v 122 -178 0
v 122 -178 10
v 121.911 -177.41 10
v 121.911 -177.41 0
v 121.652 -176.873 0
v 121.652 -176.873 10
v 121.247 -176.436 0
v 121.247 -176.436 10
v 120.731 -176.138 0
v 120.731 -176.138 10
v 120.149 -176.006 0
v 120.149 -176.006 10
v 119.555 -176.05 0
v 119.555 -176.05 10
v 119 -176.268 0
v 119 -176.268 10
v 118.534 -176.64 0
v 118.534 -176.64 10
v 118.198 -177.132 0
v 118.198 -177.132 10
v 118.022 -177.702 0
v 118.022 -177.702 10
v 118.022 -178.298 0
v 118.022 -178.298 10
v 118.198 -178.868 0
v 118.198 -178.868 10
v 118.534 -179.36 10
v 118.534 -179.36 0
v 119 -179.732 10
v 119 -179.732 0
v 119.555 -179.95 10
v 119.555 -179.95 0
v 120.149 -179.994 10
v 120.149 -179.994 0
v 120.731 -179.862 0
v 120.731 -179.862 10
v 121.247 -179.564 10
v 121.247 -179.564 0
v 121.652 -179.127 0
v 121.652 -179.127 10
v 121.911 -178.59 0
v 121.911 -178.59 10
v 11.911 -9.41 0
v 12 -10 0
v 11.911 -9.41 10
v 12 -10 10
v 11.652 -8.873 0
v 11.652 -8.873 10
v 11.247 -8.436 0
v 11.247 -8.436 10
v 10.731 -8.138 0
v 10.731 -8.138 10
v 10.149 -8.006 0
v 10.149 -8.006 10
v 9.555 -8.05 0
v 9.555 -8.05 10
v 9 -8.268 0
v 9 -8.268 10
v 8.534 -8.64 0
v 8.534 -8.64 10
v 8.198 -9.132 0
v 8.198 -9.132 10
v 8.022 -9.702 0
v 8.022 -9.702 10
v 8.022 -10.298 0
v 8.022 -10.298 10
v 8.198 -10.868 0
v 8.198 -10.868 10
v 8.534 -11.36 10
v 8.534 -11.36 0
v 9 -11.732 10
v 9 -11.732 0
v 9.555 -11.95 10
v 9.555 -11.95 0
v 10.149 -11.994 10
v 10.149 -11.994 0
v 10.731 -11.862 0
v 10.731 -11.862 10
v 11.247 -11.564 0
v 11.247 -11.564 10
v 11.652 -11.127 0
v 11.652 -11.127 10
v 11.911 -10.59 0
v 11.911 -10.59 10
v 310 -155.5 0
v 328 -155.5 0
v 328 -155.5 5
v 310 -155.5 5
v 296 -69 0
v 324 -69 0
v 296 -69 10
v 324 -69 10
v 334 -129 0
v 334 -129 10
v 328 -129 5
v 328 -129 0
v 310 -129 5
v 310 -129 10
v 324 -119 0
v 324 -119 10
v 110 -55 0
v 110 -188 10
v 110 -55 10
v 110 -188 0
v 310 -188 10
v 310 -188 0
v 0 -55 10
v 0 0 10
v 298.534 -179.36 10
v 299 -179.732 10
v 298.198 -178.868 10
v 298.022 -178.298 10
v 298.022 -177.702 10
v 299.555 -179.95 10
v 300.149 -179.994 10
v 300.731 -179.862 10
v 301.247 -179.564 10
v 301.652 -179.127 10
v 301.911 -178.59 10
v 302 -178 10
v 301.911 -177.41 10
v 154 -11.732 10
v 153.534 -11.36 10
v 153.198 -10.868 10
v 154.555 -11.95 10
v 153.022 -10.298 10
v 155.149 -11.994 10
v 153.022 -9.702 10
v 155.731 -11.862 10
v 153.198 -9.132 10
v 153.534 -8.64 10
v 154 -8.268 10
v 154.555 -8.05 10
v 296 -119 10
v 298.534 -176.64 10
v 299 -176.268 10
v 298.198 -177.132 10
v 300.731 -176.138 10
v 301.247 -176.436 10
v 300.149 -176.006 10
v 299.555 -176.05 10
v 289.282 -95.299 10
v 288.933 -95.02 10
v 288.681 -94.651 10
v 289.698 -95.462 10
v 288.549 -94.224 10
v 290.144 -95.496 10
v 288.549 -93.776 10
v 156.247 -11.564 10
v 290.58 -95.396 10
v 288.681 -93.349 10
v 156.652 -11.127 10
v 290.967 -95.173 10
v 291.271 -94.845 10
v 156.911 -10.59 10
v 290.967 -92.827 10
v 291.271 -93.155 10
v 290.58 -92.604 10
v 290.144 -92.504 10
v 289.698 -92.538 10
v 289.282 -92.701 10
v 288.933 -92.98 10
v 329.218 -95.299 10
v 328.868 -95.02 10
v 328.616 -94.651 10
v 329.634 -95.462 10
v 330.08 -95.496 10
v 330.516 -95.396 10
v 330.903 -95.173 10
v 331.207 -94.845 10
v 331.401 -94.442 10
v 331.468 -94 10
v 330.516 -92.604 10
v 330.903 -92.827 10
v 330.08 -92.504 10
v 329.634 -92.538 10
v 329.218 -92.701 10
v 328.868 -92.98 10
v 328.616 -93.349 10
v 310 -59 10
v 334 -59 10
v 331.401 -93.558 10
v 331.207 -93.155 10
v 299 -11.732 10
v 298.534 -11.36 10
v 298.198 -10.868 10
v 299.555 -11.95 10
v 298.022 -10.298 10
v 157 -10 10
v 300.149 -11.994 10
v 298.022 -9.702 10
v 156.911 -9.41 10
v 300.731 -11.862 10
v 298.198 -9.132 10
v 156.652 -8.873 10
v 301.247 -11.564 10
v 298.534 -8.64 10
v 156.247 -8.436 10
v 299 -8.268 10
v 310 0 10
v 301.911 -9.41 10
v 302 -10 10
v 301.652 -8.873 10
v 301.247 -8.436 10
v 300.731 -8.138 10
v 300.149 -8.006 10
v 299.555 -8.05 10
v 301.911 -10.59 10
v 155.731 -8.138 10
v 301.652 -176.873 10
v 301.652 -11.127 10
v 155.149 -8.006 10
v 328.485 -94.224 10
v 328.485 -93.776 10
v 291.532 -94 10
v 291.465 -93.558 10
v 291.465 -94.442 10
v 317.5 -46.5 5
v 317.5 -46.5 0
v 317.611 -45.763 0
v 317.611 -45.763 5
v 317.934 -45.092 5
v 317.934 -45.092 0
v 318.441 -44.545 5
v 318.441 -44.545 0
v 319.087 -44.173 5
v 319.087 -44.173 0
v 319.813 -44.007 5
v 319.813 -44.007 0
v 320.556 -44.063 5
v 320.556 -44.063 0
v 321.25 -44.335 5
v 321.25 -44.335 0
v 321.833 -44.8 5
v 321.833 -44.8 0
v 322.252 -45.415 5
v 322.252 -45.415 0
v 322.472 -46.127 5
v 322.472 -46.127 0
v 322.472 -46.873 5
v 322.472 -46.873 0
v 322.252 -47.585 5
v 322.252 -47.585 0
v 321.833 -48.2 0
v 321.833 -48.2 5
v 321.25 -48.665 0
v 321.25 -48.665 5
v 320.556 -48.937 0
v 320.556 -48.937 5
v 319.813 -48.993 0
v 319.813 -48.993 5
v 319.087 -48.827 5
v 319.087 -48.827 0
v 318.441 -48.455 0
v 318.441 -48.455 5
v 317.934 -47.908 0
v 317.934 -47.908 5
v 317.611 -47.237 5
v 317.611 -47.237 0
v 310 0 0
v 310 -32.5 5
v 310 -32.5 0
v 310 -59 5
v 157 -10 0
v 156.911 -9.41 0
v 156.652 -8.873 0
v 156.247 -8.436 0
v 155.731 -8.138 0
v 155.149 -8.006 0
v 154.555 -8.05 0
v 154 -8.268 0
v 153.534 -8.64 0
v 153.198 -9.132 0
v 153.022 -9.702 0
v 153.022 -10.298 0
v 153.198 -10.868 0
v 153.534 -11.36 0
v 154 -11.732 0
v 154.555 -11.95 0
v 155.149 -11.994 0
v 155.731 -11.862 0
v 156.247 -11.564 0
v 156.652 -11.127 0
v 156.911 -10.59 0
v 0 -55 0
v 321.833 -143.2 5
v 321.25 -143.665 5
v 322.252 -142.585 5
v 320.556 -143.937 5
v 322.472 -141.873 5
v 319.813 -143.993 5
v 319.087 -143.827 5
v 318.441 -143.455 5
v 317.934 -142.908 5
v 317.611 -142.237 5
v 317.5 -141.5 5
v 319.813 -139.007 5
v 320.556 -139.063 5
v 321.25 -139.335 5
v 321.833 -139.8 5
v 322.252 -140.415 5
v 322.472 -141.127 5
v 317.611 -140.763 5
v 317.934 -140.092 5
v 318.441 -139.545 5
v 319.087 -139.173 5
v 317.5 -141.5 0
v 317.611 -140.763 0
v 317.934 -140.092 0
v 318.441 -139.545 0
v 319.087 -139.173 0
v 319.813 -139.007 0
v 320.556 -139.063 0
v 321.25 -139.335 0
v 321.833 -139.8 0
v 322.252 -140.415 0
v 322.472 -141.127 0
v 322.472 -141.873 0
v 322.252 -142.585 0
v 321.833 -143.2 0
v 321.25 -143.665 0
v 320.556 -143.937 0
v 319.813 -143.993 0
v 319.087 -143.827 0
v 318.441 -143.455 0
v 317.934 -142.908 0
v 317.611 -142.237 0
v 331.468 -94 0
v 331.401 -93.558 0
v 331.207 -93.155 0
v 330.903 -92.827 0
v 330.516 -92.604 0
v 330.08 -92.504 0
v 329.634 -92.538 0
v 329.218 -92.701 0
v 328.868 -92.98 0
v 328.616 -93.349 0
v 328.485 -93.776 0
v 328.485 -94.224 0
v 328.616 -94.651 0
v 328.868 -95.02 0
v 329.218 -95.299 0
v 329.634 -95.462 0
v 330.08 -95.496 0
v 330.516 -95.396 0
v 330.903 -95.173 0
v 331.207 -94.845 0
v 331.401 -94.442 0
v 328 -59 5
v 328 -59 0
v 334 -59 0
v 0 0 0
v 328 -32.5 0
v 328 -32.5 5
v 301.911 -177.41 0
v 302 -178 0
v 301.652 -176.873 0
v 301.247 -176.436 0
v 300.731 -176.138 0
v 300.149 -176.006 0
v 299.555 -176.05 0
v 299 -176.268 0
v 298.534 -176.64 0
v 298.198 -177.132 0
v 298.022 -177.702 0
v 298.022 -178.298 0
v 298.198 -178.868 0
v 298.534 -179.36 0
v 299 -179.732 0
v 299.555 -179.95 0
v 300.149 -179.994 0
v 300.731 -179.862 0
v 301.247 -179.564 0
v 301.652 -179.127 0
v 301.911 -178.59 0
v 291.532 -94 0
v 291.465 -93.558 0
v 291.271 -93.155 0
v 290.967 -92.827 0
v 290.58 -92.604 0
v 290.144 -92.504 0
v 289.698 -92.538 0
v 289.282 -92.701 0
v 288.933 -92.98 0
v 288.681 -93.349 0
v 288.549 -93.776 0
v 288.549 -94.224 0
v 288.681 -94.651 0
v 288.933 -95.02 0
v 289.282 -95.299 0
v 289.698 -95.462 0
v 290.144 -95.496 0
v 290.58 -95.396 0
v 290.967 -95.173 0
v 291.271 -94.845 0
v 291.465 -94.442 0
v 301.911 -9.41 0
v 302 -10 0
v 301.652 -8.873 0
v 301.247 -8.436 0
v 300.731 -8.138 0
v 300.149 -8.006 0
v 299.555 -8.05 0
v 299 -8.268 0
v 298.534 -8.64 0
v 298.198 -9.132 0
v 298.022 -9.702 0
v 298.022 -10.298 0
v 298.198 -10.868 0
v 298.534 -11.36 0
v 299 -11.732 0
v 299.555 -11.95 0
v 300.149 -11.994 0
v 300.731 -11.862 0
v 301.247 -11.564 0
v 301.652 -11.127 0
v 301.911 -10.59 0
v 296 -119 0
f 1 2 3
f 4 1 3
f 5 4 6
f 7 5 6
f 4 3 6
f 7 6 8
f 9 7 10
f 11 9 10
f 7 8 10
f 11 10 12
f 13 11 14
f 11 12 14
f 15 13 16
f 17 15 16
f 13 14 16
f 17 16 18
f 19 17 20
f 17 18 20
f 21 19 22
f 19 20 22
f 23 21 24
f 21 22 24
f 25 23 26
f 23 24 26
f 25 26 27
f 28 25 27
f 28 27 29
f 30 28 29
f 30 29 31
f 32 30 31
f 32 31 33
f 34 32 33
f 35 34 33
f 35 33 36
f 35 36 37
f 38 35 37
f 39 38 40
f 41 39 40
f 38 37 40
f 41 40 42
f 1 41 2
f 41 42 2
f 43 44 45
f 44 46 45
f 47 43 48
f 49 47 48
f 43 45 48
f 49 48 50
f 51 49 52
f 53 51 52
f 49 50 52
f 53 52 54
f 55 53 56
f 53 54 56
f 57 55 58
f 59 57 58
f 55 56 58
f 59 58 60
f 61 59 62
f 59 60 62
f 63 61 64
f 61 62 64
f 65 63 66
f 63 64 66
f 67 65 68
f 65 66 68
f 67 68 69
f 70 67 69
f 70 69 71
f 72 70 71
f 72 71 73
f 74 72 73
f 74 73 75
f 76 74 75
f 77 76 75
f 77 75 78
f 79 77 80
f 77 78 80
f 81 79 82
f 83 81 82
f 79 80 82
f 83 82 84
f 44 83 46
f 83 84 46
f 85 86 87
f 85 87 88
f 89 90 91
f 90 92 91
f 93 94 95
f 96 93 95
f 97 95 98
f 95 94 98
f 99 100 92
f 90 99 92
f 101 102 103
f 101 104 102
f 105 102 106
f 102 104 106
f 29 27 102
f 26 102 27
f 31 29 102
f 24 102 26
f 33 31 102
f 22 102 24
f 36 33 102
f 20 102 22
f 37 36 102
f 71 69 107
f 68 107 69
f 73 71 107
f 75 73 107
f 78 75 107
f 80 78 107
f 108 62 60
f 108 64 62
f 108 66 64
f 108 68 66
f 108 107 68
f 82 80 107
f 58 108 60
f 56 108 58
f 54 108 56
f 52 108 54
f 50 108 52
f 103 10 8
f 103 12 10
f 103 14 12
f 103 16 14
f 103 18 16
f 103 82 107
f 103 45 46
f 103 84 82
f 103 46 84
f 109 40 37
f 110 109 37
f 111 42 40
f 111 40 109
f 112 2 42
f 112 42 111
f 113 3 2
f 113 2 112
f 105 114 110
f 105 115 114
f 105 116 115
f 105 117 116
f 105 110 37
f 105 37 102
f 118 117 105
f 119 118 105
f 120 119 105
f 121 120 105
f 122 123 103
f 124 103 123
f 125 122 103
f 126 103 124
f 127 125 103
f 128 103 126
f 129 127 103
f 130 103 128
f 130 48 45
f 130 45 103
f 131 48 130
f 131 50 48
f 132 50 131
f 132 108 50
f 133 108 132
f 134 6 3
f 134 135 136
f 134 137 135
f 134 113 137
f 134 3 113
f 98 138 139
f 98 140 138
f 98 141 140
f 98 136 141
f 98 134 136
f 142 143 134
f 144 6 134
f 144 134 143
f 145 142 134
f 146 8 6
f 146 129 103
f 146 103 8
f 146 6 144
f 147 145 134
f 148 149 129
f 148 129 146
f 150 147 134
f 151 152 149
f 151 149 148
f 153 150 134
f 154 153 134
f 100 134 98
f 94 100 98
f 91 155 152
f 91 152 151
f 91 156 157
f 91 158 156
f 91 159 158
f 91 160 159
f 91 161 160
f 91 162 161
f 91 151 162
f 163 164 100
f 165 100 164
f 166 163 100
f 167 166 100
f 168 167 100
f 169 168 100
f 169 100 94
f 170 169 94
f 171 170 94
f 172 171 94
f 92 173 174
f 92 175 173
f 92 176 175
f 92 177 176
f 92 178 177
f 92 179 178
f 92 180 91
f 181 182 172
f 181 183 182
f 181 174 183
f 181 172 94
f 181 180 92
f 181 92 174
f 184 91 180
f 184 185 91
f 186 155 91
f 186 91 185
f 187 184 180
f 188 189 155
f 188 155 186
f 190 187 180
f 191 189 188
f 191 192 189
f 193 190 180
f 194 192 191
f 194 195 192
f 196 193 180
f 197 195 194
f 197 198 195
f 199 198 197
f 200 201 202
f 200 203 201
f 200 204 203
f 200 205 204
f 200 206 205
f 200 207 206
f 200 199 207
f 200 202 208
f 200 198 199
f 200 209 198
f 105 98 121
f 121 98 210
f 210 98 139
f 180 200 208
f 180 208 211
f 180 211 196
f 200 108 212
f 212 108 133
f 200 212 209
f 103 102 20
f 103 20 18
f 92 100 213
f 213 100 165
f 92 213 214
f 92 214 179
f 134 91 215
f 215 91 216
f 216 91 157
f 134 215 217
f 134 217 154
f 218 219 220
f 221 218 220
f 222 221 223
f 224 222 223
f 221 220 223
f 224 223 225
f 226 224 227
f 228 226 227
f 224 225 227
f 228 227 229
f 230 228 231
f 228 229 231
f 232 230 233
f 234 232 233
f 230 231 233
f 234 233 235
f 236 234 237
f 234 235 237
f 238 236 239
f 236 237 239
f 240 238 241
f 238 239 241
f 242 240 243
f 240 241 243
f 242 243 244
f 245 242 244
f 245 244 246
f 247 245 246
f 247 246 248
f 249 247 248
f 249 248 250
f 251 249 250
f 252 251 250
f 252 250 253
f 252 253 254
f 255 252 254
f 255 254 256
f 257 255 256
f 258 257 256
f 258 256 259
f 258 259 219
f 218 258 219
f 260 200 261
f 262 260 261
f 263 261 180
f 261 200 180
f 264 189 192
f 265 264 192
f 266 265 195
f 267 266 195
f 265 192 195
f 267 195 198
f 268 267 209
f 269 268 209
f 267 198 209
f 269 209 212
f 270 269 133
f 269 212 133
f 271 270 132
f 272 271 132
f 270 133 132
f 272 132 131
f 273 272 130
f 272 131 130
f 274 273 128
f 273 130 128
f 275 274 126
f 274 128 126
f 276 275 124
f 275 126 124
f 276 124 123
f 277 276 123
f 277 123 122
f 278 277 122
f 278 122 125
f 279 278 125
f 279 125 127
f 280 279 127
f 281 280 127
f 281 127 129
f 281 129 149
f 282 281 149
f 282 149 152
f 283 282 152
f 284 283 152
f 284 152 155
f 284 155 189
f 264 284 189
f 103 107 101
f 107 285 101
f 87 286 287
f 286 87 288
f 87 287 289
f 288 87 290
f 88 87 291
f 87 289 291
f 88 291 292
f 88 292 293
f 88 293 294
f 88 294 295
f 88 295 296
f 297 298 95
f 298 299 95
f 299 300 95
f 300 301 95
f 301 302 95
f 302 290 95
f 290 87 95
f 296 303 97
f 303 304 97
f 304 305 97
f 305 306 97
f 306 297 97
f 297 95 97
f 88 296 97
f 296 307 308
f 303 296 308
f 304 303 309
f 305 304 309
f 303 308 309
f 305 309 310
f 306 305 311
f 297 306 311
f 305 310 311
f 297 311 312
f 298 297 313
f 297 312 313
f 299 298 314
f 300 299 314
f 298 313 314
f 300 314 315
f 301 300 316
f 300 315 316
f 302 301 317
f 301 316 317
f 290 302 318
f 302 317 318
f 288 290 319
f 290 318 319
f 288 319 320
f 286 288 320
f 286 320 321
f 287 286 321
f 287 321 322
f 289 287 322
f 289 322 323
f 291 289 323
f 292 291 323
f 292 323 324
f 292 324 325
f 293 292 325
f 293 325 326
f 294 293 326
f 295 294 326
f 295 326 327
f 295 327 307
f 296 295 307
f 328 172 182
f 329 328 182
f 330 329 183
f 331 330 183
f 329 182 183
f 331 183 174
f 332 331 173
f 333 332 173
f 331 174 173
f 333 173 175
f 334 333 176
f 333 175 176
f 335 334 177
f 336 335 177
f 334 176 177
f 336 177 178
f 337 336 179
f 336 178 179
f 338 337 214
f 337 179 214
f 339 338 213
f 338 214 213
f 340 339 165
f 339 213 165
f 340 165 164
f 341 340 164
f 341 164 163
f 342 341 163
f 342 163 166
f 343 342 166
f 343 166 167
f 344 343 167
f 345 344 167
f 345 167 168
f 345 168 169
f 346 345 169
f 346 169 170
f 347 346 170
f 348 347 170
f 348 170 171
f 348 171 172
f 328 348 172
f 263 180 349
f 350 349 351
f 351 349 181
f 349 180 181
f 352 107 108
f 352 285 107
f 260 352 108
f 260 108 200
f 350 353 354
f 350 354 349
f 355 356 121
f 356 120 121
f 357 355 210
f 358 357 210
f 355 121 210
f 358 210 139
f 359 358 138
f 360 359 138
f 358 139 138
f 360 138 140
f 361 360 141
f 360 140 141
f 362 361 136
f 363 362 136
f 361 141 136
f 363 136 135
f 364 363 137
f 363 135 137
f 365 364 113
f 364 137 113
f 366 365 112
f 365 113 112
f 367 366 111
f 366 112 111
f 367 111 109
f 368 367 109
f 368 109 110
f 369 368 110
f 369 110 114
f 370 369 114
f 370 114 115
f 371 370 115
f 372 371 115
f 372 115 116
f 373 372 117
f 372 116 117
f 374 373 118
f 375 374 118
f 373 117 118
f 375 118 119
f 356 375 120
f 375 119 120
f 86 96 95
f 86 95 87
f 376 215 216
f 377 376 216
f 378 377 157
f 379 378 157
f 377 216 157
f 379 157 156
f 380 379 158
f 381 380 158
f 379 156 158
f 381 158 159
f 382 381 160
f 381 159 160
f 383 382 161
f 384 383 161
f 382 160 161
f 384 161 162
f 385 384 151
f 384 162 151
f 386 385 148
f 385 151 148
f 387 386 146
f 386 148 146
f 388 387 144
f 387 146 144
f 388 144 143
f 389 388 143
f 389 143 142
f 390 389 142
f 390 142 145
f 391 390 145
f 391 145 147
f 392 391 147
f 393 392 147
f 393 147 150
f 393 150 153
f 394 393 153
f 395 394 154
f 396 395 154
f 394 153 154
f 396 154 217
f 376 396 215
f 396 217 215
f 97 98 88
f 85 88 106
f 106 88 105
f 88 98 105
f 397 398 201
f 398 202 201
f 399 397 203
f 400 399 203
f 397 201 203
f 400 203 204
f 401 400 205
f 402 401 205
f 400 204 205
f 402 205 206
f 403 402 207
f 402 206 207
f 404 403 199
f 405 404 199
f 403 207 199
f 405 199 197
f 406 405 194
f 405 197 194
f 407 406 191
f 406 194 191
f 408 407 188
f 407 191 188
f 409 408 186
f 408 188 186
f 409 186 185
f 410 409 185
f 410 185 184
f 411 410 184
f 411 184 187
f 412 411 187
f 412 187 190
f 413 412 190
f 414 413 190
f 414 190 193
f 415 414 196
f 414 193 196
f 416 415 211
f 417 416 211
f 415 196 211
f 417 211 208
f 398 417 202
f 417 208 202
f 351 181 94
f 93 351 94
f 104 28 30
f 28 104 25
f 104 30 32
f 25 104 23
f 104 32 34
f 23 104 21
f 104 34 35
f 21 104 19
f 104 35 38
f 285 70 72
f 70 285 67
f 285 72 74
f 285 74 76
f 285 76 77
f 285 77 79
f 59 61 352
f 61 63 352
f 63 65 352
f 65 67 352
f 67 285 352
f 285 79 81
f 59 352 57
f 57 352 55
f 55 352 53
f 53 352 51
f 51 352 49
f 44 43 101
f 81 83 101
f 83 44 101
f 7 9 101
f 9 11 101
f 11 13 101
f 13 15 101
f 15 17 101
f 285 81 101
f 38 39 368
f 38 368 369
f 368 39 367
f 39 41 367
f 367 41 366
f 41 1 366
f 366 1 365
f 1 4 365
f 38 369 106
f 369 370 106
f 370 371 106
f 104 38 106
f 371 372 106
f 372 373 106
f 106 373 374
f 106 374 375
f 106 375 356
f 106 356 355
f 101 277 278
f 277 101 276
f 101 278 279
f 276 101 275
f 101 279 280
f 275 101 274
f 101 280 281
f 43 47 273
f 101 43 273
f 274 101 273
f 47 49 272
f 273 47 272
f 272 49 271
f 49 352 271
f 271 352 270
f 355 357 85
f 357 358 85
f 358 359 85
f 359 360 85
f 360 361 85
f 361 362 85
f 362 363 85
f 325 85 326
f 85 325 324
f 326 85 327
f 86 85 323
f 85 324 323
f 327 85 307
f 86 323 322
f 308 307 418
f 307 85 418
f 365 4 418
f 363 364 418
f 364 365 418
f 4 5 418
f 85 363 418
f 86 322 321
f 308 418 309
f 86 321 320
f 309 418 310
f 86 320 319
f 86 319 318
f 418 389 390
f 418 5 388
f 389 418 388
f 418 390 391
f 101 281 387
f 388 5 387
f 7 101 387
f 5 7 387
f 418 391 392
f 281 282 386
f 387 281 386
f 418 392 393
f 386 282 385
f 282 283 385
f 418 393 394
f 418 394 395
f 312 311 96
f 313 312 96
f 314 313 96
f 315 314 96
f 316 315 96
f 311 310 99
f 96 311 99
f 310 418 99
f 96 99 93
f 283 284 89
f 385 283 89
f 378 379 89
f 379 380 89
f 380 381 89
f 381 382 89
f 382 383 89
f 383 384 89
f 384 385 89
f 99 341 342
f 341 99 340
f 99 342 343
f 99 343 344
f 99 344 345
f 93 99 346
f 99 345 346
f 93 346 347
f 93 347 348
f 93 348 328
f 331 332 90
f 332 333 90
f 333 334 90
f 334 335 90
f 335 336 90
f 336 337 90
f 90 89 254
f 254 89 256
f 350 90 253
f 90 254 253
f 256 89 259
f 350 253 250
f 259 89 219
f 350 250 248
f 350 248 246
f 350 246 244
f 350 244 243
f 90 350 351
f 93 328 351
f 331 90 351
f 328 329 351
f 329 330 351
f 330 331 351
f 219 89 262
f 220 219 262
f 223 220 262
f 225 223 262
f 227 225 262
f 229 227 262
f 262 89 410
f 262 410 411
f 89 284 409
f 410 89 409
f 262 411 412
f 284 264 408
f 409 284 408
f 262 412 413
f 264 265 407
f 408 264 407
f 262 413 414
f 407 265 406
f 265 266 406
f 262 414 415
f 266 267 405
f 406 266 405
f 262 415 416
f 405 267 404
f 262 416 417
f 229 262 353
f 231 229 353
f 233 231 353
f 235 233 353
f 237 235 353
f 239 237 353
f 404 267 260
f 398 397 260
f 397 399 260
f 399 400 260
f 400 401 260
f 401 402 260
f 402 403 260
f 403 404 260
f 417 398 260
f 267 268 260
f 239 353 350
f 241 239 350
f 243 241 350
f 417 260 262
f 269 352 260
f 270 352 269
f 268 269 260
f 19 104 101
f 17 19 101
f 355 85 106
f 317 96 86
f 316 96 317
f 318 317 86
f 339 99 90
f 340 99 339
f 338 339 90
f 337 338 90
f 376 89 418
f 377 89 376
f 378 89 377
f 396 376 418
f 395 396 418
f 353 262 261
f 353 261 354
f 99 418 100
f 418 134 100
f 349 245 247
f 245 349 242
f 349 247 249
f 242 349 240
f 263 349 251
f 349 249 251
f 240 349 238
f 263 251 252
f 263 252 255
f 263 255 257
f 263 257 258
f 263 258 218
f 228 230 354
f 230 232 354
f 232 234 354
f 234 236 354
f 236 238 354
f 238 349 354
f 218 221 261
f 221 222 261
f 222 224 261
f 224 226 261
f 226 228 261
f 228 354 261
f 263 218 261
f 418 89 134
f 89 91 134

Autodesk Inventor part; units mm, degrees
ref_plane "YZ Plane" through (0, 0, 0) normal (1, 0, 0) x (0, 1, 0)
ref_plane "XZ Plane" through (0, 0, 0) normal (0, 1, 0) x (-1, 0, 0)
ref_plane "XY Plane" through (0, 0, 0) normal (0, 0, 1) x (1, 0, 0)
sketch "Sketch1" plane through (0, 0, 0) normal (0, 0, 1) x (1, 0, 0)
  line L0 (0, 0) -> (620, 0)
  line L1 (110, -188) -> (510, -188)
  line L2 (510, -188) -> (510, -55)
  line L3 (510, -55) -> (620, -55)
  line L4 (620, -55) -> (620, 0)
  line L5 (110, -188) -> (110, -55)
  line L6 (0, -55) -> (0, 0)
  line L7 (0, -55) -> (110, -55)
  point P0 (310, -188)
  point P1 (310, 0)
  dimension "d0" = 620
  dimension "d1" = 188
  dimension "d2" = 400
  dimension "d3" = 133
extrude "Extrusion1" add sketch "Sketch1" along normal blind 10
sketch "Sketch2" plane through (0, 0, 10) normal (0, 0, 1) x (1, 0, 0)
  line L0 (620, 0) -> (0, 0) projected
  line L1 (510, -188) -> (110, -188) projected
  line L2 (620, 0) -> (310, 0)
  line L3 (310, 0) -> (310, -188)
  line L4 (310, -188) -> (620, -188)
  line L5 (620, -188) -> (620, 0)
extrude "Extrusion2" cut sketch "Sketch2" against normal through all
sketch "Sketch3" plane through (0, 0, 10) normal (0, 0, 1) x (1, 0, 0)
  circle A0 centre (10, -10) radius 2
  line L0 (310, 0) -> (0, 0) projected
  line L1 (0, 0) -> (0, -55) projected
  circle A1 centre (155, -10) radius 2
  circle A2 centre (300, -10) radius 2
  line L2 (310, -188) -> (310, 0) projected
  line L3 (10, -10) -> (300, -10) construction
  circle A3 centre (120, -178) radius 2
  line L4 (110, -55) -> (110, -188) projected
  line L5 (110, -188) -> (310, -188) projected
  circle A4 centre (300, -178) radius 2
  dimension "d8" = 4
  dimension "d9" = 10
  dimension "d10" = 10
  dimension "d11" = 4
  dimension "d12" = 4
  dimension "d13" = 10
  dimension "d14" = 4
  dimension "d15" = 10
  dimension "d16" = 10
  dimension "d17" = 4
  dimension "d18" = 10
  dimension "d19" = 10
extrude "Extrusion3" cut sketch "Sketch3" against normal through all
sketch "Sketch4" plane through (0, 0, 0) normal (0, 0, -1) x (-1, 0, 0)
  line L0 (-310, 0) -> (-310, -188) projected
  line L1 (-310, -32.5) -> (-328, -32.5)
  line L2 (-328, -32.5) -> (-328, -155.5)
  line L3 (-328, -155.5) -> (-310, -155.5)
  line L4 (-310, -155.5) -> (-310, -32.5)
  circle A0 centre (-320, -46.5) radius 2.5
  circle A1 centre (-320, -141.5) radius 2.5
  line L5 (-320, -46.5) -> (-320, -141.5) construction
  point P0 (0, 0)
  point P1 (-310, -94)
  point P2 (-320, -94)
  dimension "d22" = 18
  dimension "d23" = 123
  dimension "d24" = 5
  dimension "d25" = 5
  dimension "d26" = 10
  dimension "d27" = 95
extrude "Extrusion4" add sketch "Sketch4" against normal blind 5
sketch "Sketch6" plane through (0, 0, 10) normal (0, 0, 1) x (1, 0, 0)
  line L0 (286, -59) -> (334, -59)
  line L1 (334, -59) -> (334, -129)
  line L2 (334, -129) -> (286, -129)
  line L3 (286, -129) -> (286, -59)
  line L4 (310, -188) -> (310, 0) projected
  point P0 (0, 0)
  point P1 (310, -94)
  point P2 (310, -94)
  point P3 (286, -94)
  point P4 (310, -94)
  point P5 (310, -59)
  dimension "d42" = 48
  dimension "d43" = 70
extrude "Extrusion6" add sketch "Sketch6" against normal blind 10
sketch "Sketch7" plane through (0, 0, 10) normal (0, 0, 1) x (1, 0, 0)
  line L0 (324, -69) -> (296, -69)
  line L1 (296, -69) -> (296, -119)
  line L2 (296, -119) -> (324, -119)
  line L3 (324, -119) -> (324, -69)
  line L4 (310, -59) -> (310, 0) projected
  line L5 (334, -59) -> (334, -129) projected
  line L6 (290.0321, -94) -> (329.9679, -94) construction
  circle A0 centre (329.9679, -94) radius 1.5
  circle A1 centre (290.0321, -94) radius 1.5
  point P0 (0, 0)
  point P1 (324, -94)
  point P2 (334, -94)
  point P3 (310, -69)
  point P4 (310, -94)
  dimension "d46" = 28
  dimension "d47" = 50
  dimension "d50" = 39.9357
  dimension "d51" = 3
  dimension "d52" = 3
extrude "Extrusion7" cut sketch "Sketch7" against normal through all
properties part number "SP001b" material "ABS Plastic"
